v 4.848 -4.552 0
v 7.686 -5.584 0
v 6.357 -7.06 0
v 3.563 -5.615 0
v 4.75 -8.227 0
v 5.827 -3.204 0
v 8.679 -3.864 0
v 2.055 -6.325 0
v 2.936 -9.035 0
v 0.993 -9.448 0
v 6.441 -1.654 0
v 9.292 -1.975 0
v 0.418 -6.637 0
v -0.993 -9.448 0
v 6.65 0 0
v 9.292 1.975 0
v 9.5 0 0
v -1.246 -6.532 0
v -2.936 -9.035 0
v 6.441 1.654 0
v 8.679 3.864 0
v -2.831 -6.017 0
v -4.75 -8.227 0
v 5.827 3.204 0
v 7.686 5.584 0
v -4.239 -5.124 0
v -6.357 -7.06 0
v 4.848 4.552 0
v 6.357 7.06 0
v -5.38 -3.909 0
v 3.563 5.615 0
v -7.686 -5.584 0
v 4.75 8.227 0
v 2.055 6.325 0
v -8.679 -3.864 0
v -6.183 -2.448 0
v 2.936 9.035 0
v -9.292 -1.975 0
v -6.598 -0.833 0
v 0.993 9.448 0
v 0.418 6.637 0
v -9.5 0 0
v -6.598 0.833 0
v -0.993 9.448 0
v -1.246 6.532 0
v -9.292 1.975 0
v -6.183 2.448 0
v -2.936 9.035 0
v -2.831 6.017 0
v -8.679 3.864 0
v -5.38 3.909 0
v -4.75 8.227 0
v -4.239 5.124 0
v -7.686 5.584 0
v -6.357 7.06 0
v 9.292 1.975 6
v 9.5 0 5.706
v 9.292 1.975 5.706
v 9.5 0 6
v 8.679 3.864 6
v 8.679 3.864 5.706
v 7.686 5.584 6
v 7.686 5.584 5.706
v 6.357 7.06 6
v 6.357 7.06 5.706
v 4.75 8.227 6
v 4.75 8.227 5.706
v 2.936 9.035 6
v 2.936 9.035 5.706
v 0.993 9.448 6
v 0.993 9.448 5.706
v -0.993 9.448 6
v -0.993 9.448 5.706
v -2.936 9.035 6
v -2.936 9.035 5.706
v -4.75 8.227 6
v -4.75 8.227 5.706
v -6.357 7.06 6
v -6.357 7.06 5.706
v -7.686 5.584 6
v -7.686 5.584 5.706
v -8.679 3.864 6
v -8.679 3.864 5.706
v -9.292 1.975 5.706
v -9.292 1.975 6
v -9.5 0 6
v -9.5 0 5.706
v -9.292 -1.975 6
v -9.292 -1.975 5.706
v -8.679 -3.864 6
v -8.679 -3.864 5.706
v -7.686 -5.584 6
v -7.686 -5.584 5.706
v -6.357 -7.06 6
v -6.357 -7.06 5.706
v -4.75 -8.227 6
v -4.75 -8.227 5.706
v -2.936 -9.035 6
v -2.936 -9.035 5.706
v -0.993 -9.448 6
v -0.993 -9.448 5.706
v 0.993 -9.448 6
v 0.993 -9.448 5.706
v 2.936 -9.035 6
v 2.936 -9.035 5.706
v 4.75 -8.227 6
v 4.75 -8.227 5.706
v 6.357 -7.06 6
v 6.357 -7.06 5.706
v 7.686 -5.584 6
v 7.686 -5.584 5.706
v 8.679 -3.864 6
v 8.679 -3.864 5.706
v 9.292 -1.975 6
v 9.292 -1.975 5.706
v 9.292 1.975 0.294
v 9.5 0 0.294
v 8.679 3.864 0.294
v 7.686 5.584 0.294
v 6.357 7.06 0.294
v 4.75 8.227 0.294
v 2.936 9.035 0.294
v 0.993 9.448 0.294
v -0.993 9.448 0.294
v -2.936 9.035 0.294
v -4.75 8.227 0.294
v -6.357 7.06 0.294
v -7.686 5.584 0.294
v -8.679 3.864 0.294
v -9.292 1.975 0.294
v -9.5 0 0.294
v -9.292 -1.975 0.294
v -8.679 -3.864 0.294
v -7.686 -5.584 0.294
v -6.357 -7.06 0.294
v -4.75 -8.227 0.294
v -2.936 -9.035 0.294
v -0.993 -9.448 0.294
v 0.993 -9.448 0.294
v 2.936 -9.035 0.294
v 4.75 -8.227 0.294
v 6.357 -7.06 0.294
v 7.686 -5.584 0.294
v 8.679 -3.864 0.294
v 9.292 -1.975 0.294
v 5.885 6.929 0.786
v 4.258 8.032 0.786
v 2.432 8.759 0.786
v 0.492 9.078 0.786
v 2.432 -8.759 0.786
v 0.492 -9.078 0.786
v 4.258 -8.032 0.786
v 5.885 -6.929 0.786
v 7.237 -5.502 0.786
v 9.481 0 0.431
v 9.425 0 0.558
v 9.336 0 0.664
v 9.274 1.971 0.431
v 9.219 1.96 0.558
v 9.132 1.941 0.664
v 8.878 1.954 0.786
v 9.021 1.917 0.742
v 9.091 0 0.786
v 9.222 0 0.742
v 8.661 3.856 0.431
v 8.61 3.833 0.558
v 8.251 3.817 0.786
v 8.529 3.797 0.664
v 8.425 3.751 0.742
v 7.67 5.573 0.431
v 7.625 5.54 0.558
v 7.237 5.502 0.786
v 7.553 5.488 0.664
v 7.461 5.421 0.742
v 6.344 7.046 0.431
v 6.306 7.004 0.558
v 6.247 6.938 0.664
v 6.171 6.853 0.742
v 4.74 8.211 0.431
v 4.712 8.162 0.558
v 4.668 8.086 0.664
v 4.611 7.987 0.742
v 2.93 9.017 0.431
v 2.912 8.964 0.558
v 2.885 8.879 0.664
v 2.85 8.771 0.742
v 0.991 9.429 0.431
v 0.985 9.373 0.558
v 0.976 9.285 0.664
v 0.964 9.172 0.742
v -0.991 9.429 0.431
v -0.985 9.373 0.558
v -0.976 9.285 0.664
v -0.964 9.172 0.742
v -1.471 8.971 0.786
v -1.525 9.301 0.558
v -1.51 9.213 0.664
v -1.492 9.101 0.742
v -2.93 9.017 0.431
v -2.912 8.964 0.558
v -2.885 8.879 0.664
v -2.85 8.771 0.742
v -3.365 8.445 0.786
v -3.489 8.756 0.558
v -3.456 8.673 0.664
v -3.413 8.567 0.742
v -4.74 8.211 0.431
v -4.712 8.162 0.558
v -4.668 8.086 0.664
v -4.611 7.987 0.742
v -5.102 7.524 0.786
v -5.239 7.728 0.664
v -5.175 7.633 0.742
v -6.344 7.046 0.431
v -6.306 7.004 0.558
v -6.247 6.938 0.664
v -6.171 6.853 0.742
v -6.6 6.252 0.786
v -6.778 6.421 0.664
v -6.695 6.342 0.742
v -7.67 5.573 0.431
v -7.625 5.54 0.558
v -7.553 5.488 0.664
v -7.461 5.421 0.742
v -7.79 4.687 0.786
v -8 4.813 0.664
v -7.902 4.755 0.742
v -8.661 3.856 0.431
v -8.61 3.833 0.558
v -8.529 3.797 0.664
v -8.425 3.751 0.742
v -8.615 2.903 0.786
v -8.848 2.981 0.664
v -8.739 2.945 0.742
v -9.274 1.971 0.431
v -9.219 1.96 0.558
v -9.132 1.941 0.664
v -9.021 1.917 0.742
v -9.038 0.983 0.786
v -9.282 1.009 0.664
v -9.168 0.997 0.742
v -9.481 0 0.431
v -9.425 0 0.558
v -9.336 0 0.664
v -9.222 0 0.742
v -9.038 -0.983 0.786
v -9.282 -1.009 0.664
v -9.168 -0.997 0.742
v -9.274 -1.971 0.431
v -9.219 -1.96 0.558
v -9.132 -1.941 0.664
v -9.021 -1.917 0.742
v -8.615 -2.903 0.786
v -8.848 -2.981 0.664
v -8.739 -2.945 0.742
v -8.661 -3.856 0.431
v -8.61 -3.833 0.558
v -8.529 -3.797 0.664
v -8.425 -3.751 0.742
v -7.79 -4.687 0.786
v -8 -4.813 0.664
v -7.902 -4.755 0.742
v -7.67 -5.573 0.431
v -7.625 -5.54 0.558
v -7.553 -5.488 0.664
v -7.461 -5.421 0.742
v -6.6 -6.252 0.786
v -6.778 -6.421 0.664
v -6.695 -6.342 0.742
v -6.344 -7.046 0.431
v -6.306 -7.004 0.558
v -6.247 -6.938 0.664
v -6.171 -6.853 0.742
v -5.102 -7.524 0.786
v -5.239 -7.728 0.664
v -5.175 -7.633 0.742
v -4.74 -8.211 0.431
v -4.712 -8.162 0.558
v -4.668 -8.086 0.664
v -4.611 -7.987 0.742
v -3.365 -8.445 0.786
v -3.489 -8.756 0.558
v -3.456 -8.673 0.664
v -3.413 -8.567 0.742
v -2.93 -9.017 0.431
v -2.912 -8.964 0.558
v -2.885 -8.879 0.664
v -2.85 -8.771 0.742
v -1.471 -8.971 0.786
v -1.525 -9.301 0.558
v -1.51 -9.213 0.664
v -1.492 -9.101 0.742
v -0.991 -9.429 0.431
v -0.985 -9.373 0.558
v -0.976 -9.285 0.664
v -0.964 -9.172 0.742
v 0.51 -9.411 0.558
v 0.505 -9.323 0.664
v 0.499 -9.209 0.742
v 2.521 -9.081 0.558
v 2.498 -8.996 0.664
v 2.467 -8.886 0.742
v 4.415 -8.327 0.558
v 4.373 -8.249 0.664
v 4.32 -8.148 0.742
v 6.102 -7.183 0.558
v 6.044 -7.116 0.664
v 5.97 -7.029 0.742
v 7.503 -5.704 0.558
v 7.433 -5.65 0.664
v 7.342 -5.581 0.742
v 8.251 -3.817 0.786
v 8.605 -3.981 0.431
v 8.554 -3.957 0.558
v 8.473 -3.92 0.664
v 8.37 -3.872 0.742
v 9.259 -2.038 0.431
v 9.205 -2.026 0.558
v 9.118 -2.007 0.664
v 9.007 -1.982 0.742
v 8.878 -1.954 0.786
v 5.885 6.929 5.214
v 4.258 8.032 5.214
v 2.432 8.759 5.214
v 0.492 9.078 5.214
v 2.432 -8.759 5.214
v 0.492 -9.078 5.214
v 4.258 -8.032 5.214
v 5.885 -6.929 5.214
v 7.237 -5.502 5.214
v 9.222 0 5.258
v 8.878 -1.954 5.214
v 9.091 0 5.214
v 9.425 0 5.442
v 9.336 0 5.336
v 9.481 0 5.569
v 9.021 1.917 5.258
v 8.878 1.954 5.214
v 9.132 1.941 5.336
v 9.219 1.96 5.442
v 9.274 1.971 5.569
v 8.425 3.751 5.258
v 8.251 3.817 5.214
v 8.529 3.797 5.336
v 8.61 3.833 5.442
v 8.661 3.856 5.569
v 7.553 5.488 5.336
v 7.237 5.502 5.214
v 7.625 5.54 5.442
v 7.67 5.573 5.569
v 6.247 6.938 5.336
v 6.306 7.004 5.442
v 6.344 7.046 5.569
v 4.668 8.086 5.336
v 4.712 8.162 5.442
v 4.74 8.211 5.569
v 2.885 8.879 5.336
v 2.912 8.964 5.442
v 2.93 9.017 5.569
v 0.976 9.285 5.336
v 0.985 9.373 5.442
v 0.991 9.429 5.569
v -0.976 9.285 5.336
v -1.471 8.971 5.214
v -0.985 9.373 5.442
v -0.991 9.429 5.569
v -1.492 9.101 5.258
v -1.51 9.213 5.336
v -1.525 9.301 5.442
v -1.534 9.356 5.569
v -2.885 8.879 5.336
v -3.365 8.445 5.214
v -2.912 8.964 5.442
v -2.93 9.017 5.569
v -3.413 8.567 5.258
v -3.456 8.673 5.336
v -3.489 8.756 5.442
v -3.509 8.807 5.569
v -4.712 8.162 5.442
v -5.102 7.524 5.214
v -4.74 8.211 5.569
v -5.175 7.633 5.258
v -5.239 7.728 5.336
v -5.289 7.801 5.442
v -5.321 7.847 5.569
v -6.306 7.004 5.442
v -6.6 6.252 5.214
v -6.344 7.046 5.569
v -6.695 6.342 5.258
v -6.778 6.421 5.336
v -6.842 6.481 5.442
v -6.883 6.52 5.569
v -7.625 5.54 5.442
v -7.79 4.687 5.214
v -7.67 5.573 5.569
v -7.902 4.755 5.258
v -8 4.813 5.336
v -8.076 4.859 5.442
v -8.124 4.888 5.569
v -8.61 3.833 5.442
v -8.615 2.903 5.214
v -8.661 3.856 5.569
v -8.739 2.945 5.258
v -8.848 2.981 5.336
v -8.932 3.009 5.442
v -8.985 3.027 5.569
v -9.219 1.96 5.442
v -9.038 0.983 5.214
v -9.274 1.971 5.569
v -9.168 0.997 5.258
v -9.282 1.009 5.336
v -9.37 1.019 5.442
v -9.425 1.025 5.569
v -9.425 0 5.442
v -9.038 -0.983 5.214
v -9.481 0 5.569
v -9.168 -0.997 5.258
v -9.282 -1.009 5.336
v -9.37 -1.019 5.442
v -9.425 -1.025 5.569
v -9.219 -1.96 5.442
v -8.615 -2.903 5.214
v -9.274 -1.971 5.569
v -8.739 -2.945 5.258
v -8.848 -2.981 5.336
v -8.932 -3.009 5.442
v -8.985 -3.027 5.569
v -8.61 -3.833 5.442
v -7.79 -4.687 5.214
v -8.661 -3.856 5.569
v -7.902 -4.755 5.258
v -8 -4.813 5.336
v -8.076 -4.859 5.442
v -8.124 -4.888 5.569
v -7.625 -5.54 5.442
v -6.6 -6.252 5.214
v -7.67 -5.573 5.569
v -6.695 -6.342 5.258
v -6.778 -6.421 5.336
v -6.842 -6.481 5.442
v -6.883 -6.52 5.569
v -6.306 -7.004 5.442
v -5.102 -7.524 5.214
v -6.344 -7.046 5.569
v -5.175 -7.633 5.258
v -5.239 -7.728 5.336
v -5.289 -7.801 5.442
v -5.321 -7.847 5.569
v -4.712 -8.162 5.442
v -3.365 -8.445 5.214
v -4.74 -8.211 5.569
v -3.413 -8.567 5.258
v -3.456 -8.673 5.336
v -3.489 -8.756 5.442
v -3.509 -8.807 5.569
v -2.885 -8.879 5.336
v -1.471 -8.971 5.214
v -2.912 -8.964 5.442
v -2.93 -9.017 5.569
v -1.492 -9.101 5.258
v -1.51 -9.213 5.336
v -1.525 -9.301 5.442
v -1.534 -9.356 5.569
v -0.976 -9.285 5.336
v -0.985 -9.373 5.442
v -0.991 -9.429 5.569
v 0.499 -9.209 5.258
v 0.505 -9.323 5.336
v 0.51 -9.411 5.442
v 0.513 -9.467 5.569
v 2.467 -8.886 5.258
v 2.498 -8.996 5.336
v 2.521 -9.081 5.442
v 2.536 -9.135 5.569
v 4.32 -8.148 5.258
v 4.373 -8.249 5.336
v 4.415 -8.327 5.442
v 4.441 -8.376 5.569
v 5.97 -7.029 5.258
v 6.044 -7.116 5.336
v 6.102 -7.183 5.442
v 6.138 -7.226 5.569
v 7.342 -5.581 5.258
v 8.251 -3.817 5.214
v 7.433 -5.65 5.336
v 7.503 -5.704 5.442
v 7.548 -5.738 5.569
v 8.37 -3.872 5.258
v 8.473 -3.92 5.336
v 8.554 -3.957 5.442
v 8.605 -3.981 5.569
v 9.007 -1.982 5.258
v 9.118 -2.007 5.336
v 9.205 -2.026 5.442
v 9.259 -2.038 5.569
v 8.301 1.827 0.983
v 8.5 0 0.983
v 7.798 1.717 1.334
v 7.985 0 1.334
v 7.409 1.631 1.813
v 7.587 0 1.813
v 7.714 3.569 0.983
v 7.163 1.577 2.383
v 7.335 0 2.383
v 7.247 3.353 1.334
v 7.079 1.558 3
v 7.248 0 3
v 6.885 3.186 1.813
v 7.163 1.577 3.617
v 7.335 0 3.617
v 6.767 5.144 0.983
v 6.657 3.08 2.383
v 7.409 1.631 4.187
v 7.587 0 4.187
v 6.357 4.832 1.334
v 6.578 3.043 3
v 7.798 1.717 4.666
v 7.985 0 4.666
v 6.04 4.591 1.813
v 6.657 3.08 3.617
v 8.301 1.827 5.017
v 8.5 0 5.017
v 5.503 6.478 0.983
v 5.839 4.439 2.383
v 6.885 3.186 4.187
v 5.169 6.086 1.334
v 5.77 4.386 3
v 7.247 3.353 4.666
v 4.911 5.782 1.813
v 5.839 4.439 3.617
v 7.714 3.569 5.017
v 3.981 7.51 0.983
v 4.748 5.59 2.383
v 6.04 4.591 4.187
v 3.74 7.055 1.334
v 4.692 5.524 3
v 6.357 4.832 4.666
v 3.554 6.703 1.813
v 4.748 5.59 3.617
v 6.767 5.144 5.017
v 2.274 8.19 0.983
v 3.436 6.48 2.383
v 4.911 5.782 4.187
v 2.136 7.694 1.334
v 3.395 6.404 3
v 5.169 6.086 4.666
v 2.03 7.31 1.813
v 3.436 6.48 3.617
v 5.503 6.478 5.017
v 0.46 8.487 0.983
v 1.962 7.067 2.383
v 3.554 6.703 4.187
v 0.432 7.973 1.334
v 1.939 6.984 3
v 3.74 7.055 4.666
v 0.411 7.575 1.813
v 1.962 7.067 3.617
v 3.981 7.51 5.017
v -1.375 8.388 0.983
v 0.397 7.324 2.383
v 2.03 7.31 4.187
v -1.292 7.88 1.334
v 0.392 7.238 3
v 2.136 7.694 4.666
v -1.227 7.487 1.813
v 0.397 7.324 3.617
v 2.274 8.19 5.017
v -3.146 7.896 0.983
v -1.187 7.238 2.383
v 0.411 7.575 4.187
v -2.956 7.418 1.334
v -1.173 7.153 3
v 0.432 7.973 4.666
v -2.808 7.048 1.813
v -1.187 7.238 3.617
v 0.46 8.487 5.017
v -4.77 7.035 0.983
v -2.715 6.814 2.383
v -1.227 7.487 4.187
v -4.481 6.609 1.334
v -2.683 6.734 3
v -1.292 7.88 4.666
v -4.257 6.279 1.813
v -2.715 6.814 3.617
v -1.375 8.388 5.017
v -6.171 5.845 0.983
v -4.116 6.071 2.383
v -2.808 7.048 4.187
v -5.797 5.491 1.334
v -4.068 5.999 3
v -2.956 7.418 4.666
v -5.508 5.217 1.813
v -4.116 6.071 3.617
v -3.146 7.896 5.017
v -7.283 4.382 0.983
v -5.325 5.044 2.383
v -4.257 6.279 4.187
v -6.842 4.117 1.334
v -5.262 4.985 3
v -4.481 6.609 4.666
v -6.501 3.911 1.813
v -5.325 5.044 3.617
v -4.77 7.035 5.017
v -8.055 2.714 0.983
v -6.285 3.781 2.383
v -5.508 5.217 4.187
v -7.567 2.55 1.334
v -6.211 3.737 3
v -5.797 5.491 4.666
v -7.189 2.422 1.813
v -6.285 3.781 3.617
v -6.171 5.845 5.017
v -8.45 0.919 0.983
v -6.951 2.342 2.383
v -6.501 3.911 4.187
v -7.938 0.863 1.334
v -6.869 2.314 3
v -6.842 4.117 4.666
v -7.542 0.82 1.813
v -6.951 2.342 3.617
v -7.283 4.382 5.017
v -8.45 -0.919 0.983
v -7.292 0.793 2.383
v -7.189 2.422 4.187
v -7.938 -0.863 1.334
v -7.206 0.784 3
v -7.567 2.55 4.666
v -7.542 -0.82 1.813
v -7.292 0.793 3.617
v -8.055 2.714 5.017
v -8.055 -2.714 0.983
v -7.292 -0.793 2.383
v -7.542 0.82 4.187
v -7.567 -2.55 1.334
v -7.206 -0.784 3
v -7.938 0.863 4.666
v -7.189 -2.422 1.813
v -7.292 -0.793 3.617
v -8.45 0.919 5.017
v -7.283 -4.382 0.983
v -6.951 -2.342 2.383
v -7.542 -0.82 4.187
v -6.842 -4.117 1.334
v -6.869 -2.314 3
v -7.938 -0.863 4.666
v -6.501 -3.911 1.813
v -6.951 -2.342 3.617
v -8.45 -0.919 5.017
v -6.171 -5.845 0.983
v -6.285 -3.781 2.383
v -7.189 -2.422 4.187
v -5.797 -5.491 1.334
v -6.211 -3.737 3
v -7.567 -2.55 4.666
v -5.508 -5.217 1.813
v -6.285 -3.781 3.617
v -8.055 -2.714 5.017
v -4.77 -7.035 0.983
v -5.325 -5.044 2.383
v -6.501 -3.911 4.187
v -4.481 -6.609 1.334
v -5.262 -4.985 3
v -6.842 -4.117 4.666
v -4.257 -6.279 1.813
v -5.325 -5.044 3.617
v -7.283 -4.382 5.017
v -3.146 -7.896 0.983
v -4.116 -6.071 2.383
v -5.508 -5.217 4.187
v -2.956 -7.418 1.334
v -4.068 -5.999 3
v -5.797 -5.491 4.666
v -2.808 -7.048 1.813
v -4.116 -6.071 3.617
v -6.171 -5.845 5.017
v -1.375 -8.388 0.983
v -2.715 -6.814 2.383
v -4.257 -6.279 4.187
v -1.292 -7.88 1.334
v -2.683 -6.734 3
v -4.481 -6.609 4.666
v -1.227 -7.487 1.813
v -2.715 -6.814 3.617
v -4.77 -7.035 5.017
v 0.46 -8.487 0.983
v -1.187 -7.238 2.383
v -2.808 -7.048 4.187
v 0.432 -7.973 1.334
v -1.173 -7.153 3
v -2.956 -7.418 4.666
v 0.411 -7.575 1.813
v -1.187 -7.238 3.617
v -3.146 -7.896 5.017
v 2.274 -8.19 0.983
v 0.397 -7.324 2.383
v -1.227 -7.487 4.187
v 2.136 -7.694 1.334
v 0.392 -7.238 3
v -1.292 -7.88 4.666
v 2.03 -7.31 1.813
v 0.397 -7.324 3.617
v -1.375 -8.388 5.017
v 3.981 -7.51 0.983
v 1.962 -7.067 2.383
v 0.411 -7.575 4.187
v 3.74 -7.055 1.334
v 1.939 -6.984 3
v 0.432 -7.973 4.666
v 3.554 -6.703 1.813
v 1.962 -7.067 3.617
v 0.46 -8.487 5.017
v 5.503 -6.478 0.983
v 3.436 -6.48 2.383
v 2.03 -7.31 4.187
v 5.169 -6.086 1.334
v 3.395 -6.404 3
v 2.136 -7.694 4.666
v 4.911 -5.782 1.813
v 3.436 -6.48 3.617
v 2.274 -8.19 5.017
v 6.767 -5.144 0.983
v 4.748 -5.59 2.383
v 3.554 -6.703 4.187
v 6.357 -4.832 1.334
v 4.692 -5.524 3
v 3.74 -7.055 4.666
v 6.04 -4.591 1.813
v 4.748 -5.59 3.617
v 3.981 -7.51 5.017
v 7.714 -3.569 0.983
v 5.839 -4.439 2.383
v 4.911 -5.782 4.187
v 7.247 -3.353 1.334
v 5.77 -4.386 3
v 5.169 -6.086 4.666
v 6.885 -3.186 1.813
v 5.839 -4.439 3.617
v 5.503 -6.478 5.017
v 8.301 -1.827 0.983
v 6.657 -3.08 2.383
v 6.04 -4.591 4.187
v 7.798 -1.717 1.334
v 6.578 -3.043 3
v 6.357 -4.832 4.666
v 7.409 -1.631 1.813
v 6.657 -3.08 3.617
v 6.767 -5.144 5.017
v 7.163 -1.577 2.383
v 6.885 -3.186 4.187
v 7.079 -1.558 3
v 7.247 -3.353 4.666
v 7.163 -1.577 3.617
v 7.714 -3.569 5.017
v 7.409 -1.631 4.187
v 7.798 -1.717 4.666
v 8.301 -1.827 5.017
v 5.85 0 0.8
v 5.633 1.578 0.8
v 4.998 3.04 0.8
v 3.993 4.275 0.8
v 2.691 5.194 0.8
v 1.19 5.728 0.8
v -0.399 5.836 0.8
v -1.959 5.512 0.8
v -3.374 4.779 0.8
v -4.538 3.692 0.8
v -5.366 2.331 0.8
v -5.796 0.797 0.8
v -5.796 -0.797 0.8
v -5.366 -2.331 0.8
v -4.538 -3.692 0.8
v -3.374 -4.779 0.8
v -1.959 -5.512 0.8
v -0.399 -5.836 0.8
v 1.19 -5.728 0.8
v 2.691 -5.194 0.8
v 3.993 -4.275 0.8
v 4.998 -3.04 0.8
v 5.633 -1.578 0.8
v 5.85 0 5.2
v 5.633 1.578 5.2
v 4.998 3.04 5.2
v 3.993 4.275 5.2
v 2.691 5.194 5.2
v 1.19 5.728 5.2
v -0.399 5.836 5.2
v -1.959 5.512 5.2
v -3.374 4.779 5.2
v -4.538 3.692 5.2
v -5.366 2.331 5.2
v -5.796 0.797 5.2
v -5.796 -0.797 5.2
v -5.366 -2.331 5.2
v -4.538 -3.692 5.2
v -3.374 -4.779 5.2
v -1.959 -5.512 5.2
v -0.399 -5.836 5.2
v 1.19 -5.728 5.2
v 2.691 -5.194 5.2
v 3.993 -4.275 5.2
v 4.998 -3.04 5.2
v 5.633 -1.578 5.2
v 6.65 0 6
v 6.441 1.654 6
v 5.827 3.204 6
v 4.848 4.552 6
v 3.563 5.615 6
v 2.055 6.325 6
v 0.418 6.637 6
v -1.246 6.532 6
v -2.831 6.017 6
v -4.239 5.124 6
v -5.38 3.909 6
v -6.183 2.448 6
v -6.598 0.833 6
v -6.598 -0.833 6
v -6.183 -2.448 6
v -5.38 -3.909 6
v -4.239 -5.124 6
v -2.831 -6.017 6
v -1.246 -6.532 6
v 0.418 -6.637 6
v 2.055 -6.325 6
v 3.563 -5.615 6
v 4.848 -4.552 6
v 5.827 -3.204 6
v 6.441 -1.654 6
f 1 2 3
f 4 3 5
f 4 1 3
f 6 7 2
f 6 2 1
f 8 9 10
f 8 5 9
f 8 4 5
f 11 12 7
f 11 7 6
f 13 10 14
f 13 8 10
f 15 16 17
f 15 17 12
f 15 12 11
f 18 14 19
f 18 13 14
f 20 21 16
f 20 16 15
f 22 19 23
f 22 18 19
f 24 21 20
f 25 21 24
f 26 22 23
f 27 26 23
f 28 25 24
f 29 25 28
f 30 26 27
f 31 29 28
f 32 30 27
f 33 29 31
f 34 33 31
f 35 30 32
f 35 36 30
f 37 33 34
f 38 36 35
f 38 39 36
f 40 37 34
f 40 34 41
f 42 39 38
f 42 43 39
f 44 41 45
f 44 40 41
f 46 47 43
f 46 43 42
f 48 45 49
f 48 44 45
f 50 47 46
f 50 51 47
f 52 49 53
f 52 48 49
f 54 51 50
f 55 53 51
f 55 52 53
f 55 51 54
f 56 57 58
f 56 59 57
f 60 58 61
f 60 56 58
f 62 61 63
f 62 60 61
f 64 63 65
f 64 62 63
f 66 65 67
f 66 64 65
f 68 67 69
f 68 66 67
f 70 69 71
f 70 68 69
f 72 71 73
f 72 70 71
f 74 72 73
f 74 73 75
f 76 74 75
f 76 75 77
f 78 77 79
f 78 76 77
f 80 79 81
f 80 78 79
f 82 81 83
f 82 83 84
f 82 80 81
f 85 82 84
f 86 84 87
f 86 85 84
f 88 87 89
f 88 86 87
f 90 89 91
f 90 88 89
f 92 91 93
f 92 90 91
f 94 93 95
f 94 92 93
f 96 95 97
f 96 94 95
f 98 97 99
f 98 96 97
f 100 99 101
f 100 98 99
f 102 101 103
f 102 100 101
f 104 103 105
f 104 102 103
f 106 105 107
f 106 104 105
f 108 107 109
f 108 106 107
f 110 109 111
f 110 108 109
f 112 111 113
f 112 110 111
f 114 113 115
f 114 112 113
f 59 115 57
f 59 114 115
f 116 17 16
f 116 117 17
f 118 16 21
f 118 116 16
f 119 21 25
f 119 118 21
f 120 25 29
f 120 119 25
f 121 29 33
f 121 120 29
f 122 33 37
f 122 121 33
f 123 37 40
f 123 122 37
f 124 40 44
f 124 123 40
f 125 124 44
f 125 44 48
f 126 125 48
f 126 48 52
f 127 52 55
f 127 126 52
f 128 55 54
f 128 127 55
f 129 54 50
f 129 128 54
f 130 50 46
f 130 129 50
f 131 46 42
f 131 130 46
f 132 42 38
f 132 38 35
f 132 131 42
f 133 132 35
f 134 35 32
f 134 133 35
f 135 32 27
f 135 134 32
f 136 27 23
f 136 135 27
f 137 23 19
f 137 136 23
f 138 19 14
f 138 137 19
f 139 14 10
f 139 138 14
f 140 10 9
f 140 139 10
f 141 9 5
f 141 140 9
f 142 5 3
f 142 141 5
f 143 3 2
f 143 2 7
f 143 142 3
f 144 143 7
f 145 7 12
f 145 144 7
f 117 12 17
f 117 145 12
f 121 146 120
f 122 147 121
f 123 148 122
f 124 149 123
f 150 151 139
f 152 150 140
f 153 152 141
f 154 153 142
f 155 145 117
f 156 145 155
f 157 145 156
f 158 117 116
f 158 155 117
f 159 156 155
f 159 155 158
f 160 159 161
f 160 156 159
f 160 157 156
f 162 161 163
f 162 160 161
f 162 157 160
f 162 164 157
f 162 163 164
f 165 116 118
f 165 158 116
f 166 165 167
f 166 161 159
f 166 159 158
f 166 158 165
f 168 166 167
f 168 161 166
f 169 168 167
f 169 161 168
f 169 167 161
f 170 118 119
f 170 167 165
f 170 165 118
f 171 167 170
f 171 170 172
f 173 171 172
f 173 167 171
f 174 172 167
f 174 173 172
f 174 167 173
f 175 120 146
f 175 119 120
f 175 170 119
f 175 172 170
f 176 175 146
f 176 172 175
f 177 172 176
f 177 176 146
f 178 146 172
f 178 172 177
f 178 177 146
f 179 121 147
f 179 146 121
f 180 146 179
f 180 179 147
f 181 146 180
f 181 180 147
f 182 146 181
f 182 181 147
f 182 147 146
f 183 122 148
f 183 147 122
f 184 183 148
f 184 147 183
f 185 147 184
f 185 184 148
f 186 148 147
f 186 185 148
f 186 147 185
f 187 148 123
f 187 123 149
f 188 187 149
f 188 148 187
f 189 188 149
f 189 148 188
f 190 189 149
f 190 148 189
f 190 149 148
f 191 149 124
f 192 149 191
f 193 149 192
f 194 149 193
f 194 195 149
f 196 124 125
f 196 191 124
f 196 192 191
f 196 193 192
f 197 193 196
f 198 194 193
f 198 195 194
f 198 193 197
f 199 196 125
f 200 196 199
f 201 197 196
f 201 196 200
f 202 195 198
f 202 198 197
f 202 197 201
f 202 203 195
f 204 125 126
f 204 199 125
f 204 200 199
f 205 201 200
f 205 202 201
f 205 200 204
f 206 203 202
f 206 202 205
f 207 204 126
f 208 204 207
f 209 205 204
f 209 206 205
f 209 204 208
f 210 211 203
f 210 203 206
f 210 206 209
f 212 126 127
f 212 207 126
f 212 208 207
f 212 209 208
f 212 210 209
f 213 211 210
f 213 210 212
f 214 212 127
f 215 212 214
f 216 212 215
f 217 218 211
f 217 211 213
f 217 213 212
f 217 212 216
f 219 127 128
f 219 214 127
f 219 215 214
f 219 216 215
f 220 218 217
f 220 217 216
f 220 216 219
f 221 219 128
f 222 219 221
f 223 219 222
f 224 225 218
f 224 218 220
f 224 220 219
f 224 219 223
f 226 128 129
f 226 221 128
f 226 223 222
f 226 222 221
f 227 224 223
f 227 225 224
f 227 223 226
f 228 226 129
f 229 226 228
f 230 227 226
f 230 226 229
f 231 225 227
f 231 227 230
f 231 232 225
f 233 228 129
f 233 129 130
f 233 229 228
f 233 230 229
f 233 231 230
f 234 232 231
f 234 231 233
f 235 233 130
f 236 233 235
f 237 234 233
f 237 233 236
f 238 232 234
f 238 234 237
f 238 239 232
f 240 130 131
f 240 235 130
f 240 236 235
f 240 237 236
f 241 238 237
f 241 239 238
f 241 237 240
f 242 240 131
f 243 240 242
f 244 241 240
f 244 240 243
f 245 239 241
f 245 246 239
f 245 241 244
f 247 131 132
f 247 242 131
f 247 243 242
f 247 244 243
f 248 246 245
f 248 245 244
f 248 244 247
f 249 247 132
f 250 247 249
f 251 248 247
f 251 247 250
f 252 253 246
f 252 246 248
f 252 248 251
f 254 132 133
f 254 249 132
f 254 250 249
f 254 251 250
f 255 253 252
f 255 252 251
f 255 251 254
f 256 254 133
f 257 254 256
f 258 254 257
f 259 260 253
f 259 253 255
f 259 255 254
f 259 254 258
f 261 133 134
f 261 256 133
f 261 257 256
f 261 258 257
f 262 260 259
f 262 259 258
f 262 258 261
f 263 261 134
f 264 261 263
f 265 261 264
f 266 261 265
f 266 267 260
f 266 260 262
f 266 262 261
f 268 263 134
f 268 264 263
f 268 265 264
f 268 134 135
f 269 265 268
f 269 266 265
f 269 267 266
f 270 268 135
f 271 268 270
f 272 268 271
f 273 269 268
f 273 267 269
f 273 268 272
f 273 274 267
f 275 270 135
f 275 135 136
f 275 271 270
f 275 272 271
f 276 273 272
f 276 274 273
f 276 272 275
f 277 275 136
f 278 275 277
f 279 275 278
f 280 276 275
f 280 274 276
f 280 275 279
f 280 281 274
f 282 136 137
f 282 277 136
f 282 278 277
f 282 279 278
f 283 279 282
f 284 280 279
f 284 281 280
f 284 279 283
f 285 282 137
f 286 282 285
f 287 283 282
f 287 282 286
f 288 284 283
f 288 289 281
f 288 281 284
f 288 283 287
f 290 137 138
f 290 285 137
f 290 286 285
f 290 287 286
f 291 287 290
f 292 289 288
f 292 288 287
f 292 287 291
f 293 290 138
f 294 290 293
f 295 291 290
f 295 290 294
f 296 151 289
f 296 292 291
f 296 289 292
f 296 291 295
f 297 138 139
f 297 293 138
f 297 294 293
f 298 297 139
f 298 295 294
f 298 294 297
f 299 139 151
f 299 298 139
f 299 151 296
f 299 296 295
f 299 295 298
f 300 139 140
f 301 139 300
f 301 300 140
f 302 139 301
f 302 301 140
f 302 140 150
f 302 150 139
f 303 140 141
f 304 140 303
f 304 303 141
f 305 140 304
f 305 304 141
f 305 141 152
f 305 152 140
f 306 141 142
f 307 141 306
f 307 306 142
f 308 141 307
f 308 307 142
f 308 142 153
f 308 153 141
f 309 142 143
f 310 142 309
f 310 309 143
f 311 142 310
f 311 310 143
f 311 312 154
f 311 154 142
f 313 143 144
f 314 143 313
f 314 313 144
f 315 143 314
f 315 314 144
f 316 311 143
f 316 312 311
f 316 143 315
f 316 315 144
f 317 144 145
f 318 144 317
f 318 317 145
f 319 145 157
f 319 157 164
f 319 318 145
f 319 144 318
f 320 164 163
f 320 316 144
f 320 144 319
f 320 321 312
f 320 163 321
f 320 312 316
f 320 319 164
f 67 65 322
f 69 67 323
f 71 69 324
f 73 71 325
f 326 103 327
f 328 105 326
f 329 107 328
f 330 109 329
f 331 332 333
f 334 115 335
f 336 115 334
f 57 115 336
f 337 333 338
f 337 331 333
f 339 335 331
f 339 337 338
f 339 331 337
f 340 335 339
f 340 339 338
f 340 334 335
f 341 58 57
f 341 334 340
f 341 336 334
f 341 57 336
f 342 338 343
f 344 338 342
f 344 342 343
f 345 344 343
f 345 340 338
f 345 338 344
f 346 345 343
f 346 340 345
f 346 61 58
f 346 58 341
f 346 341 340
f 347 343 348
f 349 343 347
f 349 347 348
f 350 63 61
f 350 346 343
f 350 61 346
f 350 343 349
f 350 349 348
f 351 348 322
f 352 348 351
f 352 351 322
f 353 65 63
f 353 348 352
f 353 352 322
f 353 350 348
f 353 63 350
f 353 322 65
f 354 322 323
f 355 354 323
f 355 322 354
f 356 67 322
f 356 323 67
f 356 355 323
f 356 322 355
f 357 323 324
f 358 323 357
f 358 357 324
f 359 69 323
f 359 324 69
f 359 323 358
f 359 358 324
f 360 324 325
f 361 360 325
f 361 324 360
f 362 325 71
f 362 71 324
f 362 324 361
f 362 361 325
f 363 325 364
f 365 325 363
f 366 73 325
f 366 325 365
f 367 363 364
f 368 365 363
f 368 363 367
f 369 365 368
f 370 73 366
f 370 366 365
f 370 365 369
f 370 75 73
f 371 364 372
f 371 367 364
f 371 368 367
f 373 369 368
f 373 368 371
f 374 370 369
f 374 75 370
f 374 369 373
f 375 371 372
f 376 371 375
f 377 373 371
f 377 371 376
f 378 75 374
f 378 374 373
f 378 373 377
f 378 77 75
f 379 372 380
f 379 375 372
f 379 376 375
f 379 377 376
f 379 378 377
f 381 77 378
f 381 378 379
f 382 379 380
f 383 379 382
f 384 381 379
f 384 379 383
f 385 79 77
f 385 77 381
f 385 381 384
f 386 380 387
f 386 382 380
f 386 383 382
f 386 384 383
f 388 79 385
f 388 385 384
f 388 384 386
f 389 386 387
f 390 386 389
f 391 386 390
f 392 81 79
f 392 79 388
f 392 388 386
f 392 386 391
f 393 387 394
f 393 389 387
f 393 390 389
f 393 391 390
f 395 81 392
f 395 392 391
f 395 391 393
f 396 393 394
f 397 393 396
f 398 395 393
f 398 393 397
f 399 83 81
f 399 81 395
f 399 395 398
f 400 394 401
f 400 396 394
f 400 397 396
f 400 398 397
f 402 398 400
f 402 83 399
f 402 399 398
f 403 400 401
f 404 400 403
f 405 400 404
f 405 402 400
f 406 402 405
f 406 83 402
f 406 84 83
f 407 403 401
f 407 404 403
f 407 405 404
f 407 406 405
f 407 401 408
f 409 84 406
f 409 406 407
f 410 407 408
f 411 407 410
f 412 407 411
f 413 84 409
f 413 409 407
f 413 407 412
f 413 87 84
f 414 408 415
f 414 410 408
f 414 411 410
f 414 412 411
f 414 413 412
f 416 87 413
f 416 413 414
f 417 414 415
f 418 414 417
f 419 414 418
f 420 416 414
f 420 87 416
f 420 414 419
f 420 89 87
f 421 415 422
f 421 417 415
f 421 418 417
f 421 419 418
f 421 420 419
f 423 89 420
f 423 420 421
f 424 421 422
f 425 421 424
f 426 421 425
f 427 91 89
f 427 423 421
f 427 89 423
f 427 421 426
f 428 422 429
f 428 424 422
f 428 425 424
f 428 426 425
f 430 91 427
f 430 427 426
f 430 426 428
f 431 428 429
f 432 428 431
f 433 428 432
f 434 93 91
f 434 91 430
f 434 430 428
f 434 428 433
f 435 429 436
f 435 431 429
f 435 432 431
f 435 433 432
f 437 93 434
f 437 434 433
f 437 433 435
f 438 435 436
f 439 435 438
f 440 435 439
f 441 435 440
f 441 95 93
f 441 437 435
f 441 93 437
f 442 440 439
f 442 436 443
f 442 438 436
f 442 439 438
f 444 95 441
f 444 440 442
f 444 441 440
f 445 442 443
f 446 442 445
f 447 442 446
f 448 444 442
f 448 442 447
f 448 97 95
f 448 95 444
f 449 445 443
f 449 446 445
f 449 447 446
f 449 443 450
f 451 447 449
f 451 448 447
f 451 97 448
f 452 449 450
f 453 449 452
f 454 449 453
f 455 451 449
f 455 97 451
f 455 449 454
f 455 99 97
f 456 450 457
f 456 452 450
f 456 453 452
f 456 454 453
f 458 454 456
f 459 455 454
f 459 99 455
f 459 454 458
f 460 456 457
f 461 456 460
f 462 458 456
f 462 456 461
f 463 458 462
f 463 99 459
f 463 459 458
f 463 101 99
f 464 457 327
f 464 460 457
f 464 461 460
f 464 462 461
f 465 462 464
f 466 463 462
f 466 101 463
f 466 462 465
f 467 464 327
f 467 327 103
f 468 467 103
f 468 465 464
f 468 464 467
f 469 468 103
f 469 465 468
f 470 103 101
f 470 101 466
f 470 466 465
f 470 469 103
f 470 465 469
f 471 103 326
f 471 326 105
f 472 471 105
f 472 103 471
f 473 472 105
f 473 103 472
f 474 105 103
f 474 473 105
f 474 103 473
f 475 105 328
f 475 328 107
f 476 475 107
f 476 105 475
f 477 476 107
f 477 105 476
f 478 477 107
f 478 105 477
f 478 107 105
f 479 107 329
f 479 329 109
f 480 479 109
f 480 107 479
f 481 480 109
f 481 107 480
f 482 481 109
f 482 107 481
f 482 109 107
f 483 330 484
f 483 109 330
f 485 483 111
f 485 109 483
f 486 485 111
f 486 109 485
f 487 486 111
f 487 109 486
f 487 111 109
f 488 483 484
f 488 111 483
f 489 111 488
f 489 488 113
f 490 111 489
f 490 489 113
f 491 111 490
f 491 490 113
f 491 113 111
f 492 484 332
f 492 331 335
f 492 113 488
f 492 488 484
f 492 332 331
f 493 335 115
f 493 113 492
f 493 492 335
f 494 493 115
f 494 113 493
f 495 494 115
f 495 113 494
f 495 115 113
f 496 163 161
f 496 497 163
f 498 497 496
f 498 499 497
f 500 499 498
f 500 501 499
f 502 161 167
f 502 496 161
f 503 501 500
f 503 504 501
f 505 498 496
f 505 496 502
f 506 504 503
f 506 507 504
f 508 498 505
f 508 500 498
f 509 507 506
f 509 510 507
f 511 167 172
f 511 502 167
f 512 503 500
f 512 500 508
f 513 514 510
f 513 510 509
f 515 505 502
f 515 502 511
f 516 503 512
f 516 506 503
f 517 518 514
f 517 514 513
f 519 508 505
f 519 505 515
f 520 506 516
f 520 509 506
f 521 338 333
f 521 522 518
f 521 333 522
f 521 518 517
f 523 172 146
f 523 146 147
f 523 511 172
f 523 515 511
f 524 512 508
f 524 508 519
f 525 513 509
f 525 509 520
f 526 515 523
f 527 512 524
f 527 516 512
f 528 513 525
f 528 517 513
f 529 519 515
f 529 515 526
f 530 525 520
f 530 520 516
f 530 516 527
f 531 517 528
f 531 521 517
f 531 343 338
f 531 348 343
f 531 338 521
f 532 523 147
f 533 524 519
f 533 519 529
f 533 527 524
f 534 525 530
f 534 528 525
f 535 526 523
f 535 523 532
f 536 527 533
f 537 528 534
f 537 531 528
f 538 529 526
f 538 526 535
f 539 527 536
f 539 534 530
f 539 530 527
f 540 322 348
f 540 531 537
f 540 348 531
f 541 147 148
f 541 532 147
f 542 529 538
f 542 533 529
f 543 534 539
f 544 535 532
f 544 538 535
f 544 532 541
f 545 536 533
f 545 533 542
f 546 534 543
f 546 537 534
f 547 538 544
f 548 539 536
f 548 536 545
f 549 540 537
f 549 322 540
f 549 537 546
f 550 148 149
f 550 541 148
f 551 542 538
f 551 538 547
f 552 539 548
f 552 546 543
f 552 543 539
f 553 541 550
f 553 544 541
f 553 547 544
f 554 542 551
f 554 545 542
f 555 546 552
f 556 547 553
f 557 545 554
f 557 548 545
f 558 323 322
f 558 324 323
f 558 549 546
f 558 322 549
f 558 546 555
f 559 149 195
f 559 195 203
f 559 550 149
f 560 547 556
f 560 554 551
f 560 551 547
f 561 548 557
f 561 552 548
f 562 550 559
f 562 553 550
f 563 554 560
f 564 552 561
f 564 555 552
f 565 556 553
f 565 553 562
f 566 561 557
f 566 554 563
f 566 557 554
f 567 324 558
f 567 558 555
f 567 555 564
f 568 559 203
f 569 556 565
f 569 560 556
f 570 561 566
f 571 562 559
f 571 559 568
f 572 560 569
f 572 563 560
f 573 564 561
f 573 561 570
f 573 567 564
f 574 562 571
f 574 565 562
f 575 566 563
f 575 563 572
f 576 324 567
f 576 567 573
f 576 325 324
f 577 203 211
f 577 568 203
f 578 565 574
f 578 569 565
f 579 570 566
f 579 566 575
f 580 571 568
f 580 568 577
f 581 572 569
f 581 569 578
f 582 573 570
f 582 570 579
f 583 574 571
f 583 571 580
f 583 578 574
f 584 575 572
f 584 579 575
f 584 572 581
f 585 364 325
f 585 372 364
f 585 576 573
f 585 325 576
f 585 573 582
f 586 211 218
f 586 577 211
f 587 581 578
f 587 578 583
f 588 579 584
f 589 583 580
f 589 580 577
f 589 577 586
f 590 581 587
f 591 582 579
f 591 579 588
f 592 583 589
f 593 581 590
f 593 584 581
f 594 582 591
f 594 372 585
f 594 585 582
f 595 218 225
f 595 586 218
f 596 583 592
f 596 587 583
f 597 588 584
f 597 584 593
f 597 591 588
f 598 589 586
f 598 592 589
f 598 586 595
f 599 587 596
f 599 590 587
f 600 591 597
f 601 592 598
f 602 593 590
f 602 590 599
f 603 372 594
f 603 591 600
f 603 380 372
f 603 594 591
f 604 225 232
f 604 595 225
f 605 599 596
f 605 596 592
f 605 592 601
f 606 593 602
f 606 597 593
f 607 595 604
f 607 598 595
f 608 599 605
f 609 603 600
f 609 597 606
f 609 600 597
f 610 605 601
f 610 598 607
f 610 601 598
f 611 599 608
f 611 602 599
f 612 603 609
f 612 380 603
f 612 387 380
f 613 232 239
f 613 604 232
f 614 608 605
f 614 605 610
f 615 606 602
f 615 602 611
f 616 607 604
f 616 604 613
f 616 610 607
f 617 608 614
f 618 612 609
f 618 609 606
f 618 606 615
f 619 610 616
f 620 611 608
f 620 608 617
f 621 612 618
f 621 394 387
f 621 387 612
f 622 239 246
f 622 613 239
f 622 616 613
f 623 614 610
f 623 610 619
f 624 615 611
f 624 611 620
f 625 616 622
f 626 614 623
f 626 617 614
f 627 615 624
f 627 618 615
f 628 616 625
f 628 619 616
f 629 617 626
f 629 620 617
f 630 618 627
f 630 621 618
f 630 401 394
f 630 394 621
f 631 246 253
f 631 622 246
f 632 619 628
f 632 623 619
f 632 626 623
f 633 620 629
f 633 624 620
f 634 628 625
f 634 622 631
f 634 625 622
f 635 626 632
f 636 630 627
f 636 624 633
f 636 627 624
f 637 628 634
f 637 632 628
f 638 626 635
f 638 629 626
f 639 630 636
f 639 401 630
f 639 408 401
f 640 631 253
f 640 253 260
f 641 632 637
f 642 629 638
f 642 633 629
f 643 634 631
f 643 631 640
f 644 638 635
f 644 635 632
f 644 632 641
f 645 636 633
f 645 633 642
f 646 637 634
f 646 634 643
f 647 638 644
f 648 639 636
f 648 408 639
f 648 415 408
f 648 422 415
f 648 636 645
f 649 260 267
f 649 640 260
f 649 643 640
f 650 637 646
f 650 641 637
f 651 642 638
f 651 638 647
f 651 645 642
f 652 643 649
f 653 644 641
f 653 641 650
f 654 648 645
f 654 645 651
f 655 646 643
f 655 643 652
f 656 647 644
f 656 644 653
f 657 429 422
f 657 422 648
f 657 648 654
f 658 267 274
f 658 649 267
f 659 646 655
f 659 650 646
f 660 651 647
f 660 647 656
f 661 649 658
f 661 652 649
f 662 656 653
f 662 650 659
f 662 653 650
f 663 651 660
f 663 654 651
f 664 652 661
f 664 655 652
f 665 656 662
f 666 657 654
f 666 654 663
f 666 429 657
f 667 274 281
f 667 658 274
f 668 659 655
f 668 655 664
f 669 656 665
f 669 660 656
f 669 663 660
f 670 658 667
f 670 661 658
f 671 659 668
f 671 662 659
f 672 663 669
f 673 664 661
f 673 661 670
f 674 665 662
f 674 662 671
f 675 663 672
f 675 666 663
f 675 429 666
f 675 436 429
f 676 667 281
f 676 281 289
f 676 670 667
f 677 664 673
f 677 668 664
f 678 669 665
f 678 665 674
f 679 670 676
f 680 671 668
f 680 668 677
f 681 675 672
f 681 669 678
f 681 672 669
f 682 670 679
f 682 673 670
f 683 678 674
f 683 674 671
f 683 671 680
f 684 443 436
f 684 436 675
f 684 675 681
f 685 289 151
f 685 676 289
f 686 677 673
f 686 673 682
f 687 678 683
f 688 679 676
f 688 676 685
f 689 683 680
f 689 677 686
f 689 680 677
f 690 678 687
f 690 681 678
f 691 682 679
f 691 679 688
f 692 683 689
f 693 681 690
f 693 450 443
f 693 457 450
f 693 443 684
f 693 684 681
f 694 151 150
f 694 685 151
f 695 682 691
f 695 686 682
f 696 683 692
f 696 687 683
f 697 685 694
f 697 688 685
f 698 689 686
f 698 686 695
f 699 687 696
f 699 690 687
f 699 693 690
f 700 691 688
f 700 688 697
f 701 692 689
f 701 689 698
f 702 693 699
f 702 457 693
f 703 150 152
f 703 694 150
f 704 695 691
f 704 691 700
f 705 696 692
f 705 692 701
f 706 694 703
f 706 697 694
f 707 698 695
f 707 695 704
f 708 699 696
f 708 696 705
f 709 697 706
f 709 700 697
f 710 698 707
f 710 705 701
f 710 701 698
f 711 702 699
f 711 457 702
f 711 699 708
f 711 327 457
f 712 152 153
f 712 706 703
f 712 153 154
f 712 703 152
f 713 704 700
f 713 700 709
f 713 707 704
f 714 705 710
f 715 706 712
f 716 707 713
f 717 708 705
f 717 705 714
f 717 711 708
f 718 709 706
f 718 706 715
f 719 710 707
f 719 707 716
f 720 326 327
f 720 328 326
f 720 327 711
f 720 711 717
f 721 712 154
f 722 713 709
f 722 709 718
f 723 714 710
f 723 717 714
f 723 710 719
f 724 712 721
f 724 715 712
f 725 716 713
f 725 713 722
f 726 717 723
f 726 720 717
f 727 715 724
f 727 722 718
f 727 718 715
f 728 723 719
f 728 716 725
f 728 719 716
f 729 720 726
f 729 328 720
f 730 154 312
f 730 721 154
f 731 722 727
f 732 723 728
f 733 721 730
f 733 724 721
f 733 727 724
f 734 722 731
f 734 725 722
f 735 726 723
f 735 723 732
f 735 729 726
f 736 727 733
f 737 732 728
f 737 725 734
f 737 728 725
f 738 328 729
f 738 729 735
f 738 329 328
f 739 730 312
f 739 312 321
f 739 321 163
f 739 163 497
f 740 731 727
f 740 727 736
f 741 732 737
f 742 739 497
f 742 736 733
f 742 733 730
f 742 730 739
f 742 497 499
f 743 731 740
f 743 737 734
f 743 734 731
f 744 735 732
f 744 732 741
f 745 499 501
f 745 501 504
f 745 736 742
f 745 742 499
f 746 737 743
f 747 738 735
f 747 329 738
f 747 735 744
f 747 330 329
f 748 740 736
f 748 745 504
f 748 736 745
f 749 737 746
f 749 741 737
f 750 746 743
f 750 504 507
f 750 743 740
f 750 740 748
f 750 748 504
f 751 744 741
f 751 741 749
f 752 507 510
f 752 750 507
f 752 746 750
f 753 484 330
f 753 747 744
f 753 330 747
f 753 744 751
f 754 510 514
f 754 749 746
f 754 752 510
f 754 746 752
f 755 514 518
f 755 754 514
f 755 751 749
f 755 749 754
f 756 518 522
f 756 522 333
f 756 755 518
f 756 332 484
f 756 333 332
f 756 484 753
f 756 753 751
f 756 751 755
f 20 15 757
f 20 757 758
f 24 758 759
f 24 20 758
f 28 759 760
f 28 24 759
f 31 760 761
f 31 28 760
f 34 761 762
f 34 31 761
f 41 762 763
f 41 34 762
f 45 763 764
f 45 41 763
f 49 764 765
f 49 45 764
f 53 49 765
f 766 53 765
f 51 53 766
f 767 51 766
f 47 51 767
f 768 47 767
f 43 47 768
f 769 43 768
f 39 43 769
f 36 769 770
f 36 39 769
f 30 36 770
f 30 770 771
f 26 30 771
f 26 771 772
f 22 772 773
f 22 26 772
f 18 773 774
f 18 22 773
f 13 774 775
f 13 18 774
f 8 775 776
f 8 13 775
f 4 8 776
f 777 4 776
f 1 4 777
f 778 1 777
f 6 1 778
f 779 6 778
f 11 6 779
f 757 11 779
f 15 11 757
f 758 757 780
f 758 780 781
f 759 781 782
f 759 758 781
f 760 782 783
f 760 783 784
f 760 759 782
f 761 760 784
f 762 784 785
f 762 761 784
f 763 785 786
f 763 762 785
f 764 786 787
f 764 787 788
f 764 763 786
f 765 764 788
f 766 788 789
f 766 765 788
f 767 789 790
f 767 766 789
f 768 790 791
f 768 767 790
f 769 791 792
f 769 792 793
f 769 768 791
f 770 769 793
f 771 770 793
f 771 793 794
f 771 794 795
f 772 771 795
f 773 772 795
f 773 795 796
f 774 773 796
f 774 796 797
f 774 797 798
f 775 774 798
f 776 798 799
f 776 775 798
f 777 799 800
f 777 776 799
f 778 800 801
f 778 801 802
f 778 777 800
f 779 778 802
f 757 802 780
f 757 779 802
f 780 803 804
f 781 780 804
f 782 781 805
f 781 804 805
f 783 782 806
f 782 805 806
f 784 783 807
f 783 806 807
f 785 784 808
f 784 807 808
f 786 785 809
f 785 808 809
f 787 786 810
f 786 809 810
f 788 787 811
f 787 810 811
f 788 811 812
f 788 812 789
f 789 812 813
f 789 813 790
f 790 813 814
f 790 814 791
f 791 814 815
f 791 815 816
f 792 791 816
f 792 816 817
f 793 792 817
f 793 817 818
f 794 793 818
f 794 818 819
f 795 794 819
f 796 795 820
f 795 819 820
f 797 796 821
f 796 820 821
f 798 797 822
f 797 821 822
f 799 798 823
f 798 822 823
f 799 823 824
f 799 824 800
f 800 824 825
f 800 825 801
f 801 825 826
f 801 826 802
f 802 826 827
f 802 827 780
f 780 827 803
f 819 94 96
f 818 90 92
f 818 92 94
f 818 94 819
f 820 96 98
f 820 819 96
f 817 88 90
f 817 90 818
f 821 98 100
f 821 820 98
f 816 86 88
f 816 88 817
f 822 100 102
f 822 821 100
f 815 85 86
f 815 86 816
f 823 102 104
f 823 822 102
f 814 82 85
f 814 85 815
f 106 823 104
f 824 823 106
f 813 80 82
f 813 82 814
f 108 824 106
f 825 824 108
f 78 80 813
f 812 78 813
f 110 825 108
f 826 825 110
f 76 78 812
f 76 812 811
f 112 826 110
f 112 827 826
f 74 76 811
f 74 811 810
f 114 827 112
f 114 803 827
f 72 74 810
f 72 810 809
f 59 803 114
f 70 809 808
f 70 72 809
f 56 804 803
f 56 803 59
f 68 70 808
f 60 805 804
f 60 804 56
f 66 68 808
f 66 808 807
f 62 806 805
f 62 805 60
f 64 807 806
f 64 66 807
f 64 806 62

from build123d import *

# Parameters (mm, degrees)
F2_SIZE = 0.8


# Not quite as in the source:
# - a feature of the source that left no trace in its solid (it failed there, or was rolled back) is left out


with BuildPart() as f1:
    # F0 (on Front) → F1 (revolve)
    with BuildSketch(Plane.XZ):
        with BuildLine():
            Line((5.85, 6), (5.85, 0))
            Line((5.85, 0), (9.5, 0))
            Line((9.5, 0), (9.5, 0.294127265))
            ThreePointArc((9.5, 0.294127265), (9.3843349974, 0.6139500436), (9.090853561, 0.7858036122))
            ThreePointArc((9.090853561, 0.7858036122), (7.248319194, 3), (9.090853561, 5.2141963878))
            ThreePointArc((9.090853561, 5.2141963878), (9.3843349974, 5.3860499564), (9.5, 5.705872735))
            Line((9.5, 5.705872735), (9.5, 6))
            Line((9.5, 6), (5.85, 6))
        make_face()
    revolve(axis=Axis((0, 0, 22.371660918), (0, 0, 1)))

    # F2
    f2_edges = [f1.edges().sort_by_distance(p)[0] for p in [
        (-5.85, 0, 0),
        (-5.85, 0, 6),
    ]]
    chamfer(f2_edges, length=F2_SIZE)


solid = f1.part
